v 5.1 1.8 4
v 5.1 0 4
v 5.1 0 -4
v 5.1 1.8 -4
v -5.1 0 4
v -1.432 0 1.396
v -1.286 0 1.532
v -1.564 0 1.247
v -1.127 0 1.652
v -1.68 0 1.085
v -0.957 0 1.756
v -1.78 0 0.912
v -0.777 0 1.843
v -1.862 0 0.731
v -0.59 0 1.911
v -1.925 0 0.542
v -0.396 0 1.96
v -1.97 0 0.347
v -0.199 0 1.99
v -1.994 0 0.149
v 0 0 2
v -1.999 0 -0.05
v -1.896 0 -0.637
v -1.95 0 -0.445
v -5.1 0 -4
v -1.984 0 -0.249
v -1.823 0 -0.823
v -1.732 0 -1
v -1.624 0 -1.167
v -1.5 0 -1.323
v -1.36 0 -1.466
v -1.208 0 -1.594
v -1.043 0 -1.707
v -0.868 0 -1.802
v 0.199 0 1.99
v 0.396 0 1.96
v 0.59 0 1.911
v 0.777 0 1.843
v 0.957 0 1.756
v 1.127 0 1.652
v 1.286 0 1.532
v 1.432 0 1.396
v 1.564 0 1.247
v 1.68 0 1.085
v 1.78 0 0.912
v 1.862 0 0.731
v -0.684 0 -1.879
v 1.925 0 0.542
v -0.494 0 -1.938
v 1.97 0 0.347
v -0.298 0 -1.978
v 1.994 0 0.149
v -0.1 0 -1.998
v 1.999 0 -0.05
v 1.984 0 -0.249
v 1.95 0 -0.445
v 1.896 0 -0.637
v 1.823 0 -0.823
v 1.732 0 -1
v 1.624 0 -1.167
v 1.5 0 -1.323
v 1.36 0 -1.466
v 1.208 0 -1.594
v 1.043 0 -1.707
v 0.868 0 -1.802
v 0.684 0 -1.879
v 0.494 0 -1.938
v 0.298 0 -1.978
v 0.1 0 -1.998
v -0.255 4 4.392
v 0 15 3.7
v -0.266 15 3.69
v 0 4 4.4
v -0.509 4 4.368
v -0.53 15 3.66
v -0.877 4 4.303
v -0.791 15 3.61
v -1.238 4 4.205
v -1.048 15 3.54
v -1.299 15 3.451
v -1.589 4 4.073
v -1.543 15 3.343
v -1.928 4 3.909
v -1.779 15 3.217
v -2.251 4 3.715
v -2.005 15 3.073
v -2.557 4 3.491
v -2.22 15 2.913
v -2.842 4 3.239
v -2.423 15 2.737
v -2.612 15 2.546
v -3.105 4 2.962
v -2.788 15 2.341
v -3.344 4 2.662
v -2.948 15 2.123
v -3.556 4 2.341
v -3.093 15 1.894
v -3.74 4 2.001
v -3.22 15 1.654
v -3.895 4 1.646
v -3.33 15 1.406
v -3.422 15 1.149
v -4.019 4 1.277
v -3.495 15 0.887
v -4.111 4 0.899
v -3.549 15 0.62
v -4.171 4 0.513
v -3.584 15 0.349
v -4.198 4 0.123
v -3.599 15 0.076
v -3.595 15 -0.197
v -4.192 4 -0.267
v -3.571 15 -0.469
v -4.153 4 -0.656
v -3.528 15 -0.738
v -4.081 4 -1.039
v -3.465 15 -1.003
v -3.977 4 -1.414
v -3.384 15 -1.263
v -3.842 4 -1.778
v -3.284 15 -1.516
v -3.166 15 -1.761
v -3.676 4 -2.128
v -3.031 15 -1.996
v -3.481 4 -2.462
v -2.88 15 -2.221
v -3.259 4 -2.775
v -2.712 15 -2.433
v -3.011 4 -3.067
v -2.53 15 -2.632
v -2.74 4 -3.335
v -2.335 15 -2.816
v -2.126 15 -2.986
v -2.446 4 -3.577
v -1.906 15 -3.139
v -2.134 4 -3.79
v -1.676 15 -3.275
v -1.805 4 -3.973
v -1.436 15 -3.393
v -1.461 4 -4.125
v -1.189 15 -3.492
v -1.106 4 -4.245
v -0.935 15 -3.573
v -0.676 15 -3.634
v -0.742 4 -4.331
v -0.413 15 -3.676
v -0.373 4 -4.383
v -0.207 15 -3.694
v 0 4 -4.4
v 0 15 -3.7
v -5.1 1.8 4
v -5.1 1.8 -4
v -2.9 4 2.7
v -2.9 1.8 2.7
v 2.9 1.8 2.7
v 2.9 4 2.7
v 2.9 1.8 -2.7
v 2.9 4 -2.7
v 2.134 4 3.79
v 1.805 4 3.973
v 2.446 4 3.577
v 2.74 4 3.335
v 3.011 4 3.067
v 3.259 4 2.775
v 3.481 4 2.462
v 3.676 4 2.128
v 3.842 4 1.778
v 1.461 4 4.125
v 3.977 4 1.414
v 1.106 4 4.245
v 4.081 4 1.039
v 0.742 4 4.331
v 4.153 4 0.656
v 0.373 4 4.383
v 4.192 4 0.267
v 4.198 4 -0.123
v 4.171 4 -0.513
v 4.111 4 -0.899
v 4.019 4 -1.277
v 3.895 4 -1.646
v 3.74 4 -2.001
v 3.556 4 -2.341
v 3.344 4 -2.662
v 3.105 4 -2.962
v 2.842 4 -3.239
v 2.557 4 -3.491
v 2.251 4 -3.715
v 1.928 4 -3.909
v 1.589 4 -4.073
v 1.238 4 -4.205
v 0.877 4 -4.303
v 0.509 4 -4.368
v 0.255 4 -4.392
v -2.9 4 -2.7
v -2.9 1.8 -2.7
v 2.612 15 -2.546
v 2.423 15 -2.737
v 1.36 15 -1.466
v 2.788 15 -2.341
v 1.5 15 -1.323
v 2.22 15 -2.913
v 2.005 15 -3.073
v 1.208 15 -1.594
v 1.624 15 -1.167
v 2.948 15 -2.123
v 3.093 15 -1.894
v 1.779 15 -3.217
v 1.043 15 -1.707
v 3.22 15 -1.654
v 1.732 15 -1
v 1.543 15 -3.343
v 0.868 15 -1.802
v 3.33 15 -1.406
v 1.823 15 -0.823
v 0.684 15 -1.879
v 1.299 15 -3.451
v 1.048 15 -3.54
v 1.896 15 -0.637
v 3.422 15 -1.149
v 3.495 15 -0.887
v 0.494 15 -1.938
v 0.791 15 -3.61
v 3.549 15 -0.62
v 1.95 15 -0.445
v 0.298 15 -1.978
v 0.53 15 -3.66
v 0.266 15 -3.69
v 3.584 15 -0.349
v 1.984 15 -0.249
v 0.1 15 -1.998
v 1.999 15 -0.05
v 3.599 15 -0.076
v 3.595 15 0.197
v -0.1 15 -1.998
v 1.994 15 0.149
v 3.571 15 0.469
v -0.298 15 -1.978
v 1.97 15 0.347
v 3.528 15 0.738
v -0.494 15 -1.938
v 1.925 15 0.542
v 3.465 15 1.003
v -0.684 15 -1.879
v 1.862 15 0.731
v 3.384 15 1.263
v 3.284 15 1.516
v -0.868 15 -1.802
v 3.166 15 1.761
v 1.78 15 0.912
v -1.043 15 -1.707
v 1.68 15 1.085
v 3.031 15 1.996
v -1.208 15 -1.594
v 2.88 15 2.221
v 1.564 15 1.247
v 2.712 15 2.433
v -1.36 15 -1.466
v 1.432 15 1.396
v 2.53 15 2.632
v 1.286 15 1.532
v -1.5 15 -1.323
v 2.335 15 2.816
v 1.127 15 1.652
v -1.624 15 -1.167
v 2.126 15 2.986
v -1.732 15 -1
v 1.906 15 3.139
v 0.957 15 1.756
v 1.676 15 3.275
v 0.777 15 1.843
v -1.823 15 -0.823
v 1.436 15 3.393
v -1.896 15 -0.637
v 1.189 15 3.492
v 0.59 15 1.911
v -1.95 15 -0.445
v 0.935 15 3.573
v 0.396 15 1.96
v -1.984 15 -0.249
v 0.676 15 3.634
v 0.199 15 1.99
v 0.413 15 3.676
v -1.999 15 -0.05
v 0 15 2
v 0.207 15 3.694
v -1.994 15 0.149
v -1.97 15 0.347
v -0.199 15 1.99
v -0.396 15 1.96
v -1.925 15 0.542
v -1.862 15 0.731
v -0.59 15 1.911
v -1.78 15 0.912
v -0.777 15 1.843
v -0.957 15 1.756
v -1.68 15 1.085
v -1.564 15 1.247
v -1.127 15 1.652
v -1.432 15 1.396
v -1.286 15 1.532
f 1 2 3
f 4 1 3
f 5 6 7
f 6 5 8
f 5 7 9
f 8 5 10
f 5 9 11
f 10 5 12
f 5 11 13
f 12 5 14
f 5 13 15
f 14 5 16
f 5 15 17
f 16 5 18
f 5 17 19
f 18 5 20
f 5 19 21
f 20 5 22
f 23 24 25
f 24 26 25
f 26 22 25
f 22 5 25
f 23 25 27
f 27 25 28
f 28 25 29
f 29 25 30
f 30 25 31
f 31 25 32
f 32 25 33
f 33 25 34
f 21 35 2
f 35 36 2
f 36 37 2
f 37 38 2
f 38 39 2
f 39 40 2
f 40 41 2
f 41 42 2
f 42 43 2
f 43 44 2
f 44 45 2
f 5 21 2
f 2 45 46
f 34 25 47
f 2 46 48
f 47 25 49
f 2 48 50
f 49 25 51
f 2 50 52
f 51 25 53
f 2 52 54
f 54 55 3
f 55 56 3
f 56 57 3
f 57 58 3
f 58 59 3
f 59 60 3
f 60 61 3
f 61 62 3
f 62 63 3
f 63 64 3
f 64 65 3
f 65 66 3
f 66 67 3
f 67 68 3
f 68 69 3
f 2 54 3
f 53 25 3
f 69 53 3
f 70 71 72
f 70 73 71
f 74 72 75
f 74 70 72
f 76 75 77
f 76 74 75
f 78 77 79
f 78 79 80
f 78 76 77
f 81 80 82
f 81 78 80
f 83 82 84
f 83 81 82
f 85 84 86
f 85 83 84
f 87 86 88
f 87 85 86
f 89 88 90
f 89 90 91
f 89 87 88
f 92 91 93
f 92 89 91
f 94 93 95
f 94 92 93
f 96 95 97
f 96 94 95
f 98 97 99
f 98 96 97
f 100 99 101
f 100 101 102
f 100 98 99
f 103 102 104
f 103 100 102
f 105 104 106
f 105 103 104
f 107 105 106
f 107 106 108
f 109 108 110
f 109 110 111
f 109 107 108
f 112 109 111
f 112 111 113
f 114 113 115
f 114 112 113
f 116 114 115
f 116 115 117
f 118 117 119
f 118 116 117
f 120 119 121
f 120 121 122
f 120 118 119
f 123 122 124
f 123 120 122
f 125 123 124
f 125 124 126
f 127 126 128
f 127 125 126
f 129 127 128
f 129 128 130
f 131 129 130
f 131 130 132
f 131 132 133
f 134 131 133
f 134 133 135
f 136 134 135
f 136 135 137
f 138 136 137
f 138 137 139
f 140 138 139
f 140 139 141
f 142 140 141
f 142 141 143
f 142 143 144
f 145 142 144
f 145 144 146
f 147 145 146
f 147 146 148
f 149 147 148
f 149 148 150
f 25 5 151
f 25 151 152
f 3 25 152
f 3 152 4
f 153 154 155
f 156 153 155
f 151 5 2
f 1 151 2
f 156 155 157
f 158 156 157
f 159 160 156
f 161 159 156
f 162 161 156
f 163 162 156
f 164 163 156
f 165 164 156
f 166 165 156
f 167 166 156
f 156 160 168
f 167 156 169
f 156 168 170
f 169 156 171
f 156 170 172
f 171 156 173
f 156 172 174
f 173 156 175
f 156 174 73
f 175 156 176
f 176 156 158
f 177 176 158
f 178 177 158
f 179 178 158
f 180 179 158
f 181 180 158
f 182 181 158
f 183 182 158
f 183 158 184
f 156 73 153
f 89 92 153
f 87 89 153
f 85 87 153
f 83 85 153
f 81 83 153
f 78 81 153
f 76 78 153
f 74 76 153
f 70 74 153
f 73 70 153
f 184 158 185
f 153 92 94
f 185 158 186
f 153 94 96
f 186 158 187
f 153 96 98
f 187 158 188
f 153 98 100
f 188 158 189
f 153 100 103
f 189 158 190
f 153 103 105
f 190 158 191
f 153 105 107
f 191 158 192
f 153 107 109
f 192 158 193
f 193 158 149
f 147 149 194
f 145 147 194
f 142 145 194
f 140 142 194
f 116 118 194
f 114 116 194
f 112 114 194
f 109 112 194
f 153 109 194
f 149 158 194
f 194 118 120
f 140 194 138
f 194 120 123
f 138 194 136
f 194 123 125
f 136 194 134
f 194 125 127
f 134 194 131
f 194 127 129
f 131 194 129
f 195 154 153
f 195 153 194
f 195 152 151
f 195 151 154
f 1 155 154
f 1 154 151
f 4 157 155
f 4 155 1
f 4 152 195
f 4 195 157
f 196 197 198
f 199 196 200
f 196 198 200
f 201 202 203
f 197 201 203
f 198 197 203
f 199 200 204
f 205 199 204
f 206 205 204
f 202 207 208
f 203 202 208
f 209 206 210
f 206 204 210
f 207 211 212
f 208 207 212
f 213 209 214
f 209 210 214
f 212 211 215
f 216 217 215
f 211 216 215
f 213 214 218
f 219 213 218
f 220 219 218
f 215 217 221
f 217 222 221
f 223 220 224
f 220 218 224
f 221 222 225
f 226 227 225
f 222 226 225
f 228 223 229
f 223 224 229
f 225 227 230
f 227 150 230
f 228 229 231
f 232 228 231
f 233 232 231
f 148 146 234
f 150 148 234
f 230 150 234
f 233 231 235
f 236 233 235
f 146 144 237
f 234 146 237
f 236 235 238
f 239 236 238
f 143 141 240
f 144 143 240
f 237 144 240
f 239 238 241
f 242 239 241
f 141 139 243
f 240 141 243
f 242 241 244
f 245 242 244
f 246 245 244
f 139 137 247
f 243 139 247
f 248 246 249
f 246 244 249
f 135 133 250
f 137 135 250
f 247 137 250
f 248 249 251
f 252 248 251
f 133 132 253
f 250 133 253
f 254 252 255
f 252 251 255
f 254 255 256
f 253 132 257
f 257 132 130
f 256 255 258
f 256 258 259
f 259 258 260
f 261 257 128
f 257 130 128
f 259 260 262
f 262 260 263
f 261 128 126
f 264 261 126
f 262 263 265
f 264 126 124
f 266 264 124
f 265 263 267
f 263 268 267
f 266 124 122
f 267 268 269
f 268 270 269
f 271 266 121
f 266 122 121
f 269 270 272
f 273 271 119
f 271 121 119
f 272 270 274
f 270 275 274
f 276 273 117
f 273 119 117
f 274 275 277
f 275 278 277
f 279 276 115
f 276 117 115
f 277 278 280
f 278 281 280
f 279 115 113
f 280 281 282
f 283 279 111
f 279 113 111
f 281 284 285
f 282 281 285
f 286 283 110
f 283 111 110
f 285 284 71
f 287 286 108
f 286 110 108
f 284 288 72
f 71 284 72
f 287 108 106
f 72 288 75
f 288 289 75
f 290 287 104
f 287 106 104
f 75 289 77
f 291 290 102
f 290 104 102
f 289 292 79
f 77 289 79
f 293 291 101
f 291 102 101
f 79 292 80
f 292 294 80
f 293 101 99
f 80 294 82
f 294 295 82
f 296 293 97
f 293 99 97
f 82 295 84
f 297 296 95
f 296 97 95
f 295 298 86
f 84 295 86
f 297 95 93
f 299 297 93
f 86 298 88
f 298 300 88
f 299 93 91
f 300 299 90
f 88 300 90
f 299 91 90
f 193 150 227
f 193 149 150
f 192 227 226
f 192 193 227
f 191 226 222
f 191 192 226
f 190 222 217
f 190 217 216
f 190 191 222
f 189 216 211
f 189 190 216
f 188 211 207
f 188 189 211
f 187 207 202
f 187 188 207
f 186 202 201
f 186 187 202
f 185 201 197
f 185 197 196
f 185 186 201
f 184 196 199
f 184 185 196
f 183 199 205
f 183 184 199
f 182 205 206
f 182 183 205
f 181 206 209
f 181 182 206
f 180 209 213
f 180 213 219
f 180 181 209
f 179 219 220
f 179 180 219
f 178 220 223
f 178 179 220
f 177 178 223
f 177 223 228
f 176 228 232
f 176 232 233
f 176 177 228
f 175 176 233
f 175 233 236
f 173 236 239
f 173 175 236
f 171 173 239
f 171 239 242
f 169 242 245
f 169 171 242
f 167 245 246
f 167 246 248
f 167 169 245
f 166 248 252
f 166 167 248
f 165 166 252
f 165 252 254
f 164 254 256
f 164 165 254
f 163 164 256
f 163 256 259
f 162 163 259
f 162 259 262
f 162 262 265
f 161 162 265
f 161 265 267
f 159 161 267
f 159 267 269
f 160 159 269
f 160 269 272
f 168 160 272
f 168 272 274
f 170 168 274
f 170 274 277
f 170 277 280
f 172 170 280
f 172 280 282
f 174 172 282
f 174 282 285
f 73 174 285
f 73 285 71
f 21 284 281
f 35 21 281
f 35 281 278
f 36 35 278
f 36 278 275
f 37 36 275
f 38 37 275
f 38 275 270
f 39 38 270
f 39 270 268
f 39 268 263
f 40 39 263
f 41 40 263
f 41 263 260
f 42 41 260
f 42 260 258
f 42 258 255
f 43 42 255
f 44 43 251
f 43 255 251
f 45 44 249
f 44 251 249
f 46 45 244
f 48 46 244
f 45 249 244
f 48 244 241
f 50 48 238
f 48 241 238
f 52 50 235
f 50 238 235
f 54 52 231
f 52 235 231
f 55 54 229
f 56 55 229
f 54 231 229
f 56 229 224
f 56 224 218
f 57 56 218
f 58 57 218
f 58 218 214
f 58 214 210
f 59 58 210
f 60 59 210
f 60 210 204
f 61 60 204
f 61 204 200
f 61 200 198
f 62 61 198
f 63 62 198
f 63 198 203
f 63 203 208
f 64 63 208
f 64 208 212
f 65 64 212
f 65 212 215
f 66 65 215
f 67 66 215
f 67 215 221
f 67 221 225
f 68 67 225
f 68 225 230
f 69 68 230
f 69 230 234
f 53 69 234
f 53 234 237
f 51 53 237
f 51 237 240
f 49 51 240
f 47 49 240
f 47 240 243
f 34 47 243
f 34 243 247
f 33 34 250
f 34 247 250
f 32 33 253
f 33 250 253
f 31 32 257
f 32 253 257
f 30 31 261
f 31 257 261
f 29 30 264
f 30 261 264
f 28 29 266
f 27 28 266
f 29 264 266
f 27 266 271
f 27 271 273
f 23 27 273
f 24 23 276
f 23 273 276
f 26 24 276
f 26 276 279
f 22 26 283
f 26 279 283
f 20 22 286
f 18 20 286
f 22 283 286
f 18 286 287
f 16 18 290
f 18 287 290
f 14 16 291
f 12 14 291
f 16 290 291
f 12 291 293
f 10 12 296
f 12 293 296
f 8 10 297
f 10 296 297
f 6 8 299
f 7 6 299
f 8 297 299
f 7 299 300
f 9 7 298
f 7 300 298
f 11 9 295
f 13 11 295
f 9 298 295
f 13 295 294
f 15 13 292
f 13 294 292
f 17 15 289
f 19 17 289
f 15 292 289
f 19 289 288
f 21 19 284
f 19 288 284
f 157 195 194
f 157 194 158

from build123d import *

# Parameters (mm, degrees)
SKETCH_4_W          = 10.2
SKETCH_4_H          = 8
EXTRUDE_1_DEPTH     = 1.8
SKETCH_5_W          = 5.8
SKETCH_5_H          = 5.4
EXTRUDE_2_DEPTH     = 2.2
SKETCH_7_RX         = 3.7
SKETCH_7_RY         = 3.6
SKETCH_6_RX         = 4.4
SKETCH_6_RY         = 4.2
SKETCH_8_R          = 2
CUT_EXTRUDE_1_DEPTH = 17.442931639


with BuildPart() as part:
    # 草图4 → 凸台-拉伸1 (new body)
    with BuildSketch(Plane(origin=(0, 0, 0), x_dir=(1, 0, 0), z_dir=(0, 1, 0))):
        Rectangle(SKETCH_4_W, SKETCH_4_H)
    extrude(amount=EXTRUDE_1_DEPTH)

    # 草图5 → 凸台-拉伸2 (add)
    with BuildSketch(Plane(origin=(0, 1.8, 0), x_dir=(1, 0, 0), z_dir=(0, 1, 0))):
        Rectangle(SKETCH_5_W, SKETCH_5_H)
    extrude(amount=EXTRUDE_2_DEPTH)

    # 草图7 → 放样1 section 0
    with BuildSketch(Plane(origin=(0, 15, 0), x_dir=(-1, 0, 0), z_dir=(0, -1, 0))):
        with Locations(Location((0, 0), (0, 0, -90))):
            Ellipse(SKETCH_7_RX, SKETCH_7_RY)
    # 草图6 → 放样1 section 1
    with BuildSketch(Plane(origin=(0, 4, 0), x_dir=(1, 0, 0), z_dir=(0, 1, 0))):
        with Locations(Location((0, 0), (0, 0, 90))):
            Ellipse(SKETCH_6_RX, SKETCH_6_RY)
    loft()

    # 草图8 → 切除-拉伸1 (cut, through all)
    with BuildSketch(Plane(origin=(0, 15, 0), x_dir=(1, 0, 0), z_dir=(0, 1, 0))):
        with Locations(Location((0, 0, 0), (0, 0, 270))):
            Circle(SKETCH_8_R)
    extrude(amount=-CUT_EXTRUDE_1_DEPTH, mode=Mode.SUBTRACT)


solid = part.part
